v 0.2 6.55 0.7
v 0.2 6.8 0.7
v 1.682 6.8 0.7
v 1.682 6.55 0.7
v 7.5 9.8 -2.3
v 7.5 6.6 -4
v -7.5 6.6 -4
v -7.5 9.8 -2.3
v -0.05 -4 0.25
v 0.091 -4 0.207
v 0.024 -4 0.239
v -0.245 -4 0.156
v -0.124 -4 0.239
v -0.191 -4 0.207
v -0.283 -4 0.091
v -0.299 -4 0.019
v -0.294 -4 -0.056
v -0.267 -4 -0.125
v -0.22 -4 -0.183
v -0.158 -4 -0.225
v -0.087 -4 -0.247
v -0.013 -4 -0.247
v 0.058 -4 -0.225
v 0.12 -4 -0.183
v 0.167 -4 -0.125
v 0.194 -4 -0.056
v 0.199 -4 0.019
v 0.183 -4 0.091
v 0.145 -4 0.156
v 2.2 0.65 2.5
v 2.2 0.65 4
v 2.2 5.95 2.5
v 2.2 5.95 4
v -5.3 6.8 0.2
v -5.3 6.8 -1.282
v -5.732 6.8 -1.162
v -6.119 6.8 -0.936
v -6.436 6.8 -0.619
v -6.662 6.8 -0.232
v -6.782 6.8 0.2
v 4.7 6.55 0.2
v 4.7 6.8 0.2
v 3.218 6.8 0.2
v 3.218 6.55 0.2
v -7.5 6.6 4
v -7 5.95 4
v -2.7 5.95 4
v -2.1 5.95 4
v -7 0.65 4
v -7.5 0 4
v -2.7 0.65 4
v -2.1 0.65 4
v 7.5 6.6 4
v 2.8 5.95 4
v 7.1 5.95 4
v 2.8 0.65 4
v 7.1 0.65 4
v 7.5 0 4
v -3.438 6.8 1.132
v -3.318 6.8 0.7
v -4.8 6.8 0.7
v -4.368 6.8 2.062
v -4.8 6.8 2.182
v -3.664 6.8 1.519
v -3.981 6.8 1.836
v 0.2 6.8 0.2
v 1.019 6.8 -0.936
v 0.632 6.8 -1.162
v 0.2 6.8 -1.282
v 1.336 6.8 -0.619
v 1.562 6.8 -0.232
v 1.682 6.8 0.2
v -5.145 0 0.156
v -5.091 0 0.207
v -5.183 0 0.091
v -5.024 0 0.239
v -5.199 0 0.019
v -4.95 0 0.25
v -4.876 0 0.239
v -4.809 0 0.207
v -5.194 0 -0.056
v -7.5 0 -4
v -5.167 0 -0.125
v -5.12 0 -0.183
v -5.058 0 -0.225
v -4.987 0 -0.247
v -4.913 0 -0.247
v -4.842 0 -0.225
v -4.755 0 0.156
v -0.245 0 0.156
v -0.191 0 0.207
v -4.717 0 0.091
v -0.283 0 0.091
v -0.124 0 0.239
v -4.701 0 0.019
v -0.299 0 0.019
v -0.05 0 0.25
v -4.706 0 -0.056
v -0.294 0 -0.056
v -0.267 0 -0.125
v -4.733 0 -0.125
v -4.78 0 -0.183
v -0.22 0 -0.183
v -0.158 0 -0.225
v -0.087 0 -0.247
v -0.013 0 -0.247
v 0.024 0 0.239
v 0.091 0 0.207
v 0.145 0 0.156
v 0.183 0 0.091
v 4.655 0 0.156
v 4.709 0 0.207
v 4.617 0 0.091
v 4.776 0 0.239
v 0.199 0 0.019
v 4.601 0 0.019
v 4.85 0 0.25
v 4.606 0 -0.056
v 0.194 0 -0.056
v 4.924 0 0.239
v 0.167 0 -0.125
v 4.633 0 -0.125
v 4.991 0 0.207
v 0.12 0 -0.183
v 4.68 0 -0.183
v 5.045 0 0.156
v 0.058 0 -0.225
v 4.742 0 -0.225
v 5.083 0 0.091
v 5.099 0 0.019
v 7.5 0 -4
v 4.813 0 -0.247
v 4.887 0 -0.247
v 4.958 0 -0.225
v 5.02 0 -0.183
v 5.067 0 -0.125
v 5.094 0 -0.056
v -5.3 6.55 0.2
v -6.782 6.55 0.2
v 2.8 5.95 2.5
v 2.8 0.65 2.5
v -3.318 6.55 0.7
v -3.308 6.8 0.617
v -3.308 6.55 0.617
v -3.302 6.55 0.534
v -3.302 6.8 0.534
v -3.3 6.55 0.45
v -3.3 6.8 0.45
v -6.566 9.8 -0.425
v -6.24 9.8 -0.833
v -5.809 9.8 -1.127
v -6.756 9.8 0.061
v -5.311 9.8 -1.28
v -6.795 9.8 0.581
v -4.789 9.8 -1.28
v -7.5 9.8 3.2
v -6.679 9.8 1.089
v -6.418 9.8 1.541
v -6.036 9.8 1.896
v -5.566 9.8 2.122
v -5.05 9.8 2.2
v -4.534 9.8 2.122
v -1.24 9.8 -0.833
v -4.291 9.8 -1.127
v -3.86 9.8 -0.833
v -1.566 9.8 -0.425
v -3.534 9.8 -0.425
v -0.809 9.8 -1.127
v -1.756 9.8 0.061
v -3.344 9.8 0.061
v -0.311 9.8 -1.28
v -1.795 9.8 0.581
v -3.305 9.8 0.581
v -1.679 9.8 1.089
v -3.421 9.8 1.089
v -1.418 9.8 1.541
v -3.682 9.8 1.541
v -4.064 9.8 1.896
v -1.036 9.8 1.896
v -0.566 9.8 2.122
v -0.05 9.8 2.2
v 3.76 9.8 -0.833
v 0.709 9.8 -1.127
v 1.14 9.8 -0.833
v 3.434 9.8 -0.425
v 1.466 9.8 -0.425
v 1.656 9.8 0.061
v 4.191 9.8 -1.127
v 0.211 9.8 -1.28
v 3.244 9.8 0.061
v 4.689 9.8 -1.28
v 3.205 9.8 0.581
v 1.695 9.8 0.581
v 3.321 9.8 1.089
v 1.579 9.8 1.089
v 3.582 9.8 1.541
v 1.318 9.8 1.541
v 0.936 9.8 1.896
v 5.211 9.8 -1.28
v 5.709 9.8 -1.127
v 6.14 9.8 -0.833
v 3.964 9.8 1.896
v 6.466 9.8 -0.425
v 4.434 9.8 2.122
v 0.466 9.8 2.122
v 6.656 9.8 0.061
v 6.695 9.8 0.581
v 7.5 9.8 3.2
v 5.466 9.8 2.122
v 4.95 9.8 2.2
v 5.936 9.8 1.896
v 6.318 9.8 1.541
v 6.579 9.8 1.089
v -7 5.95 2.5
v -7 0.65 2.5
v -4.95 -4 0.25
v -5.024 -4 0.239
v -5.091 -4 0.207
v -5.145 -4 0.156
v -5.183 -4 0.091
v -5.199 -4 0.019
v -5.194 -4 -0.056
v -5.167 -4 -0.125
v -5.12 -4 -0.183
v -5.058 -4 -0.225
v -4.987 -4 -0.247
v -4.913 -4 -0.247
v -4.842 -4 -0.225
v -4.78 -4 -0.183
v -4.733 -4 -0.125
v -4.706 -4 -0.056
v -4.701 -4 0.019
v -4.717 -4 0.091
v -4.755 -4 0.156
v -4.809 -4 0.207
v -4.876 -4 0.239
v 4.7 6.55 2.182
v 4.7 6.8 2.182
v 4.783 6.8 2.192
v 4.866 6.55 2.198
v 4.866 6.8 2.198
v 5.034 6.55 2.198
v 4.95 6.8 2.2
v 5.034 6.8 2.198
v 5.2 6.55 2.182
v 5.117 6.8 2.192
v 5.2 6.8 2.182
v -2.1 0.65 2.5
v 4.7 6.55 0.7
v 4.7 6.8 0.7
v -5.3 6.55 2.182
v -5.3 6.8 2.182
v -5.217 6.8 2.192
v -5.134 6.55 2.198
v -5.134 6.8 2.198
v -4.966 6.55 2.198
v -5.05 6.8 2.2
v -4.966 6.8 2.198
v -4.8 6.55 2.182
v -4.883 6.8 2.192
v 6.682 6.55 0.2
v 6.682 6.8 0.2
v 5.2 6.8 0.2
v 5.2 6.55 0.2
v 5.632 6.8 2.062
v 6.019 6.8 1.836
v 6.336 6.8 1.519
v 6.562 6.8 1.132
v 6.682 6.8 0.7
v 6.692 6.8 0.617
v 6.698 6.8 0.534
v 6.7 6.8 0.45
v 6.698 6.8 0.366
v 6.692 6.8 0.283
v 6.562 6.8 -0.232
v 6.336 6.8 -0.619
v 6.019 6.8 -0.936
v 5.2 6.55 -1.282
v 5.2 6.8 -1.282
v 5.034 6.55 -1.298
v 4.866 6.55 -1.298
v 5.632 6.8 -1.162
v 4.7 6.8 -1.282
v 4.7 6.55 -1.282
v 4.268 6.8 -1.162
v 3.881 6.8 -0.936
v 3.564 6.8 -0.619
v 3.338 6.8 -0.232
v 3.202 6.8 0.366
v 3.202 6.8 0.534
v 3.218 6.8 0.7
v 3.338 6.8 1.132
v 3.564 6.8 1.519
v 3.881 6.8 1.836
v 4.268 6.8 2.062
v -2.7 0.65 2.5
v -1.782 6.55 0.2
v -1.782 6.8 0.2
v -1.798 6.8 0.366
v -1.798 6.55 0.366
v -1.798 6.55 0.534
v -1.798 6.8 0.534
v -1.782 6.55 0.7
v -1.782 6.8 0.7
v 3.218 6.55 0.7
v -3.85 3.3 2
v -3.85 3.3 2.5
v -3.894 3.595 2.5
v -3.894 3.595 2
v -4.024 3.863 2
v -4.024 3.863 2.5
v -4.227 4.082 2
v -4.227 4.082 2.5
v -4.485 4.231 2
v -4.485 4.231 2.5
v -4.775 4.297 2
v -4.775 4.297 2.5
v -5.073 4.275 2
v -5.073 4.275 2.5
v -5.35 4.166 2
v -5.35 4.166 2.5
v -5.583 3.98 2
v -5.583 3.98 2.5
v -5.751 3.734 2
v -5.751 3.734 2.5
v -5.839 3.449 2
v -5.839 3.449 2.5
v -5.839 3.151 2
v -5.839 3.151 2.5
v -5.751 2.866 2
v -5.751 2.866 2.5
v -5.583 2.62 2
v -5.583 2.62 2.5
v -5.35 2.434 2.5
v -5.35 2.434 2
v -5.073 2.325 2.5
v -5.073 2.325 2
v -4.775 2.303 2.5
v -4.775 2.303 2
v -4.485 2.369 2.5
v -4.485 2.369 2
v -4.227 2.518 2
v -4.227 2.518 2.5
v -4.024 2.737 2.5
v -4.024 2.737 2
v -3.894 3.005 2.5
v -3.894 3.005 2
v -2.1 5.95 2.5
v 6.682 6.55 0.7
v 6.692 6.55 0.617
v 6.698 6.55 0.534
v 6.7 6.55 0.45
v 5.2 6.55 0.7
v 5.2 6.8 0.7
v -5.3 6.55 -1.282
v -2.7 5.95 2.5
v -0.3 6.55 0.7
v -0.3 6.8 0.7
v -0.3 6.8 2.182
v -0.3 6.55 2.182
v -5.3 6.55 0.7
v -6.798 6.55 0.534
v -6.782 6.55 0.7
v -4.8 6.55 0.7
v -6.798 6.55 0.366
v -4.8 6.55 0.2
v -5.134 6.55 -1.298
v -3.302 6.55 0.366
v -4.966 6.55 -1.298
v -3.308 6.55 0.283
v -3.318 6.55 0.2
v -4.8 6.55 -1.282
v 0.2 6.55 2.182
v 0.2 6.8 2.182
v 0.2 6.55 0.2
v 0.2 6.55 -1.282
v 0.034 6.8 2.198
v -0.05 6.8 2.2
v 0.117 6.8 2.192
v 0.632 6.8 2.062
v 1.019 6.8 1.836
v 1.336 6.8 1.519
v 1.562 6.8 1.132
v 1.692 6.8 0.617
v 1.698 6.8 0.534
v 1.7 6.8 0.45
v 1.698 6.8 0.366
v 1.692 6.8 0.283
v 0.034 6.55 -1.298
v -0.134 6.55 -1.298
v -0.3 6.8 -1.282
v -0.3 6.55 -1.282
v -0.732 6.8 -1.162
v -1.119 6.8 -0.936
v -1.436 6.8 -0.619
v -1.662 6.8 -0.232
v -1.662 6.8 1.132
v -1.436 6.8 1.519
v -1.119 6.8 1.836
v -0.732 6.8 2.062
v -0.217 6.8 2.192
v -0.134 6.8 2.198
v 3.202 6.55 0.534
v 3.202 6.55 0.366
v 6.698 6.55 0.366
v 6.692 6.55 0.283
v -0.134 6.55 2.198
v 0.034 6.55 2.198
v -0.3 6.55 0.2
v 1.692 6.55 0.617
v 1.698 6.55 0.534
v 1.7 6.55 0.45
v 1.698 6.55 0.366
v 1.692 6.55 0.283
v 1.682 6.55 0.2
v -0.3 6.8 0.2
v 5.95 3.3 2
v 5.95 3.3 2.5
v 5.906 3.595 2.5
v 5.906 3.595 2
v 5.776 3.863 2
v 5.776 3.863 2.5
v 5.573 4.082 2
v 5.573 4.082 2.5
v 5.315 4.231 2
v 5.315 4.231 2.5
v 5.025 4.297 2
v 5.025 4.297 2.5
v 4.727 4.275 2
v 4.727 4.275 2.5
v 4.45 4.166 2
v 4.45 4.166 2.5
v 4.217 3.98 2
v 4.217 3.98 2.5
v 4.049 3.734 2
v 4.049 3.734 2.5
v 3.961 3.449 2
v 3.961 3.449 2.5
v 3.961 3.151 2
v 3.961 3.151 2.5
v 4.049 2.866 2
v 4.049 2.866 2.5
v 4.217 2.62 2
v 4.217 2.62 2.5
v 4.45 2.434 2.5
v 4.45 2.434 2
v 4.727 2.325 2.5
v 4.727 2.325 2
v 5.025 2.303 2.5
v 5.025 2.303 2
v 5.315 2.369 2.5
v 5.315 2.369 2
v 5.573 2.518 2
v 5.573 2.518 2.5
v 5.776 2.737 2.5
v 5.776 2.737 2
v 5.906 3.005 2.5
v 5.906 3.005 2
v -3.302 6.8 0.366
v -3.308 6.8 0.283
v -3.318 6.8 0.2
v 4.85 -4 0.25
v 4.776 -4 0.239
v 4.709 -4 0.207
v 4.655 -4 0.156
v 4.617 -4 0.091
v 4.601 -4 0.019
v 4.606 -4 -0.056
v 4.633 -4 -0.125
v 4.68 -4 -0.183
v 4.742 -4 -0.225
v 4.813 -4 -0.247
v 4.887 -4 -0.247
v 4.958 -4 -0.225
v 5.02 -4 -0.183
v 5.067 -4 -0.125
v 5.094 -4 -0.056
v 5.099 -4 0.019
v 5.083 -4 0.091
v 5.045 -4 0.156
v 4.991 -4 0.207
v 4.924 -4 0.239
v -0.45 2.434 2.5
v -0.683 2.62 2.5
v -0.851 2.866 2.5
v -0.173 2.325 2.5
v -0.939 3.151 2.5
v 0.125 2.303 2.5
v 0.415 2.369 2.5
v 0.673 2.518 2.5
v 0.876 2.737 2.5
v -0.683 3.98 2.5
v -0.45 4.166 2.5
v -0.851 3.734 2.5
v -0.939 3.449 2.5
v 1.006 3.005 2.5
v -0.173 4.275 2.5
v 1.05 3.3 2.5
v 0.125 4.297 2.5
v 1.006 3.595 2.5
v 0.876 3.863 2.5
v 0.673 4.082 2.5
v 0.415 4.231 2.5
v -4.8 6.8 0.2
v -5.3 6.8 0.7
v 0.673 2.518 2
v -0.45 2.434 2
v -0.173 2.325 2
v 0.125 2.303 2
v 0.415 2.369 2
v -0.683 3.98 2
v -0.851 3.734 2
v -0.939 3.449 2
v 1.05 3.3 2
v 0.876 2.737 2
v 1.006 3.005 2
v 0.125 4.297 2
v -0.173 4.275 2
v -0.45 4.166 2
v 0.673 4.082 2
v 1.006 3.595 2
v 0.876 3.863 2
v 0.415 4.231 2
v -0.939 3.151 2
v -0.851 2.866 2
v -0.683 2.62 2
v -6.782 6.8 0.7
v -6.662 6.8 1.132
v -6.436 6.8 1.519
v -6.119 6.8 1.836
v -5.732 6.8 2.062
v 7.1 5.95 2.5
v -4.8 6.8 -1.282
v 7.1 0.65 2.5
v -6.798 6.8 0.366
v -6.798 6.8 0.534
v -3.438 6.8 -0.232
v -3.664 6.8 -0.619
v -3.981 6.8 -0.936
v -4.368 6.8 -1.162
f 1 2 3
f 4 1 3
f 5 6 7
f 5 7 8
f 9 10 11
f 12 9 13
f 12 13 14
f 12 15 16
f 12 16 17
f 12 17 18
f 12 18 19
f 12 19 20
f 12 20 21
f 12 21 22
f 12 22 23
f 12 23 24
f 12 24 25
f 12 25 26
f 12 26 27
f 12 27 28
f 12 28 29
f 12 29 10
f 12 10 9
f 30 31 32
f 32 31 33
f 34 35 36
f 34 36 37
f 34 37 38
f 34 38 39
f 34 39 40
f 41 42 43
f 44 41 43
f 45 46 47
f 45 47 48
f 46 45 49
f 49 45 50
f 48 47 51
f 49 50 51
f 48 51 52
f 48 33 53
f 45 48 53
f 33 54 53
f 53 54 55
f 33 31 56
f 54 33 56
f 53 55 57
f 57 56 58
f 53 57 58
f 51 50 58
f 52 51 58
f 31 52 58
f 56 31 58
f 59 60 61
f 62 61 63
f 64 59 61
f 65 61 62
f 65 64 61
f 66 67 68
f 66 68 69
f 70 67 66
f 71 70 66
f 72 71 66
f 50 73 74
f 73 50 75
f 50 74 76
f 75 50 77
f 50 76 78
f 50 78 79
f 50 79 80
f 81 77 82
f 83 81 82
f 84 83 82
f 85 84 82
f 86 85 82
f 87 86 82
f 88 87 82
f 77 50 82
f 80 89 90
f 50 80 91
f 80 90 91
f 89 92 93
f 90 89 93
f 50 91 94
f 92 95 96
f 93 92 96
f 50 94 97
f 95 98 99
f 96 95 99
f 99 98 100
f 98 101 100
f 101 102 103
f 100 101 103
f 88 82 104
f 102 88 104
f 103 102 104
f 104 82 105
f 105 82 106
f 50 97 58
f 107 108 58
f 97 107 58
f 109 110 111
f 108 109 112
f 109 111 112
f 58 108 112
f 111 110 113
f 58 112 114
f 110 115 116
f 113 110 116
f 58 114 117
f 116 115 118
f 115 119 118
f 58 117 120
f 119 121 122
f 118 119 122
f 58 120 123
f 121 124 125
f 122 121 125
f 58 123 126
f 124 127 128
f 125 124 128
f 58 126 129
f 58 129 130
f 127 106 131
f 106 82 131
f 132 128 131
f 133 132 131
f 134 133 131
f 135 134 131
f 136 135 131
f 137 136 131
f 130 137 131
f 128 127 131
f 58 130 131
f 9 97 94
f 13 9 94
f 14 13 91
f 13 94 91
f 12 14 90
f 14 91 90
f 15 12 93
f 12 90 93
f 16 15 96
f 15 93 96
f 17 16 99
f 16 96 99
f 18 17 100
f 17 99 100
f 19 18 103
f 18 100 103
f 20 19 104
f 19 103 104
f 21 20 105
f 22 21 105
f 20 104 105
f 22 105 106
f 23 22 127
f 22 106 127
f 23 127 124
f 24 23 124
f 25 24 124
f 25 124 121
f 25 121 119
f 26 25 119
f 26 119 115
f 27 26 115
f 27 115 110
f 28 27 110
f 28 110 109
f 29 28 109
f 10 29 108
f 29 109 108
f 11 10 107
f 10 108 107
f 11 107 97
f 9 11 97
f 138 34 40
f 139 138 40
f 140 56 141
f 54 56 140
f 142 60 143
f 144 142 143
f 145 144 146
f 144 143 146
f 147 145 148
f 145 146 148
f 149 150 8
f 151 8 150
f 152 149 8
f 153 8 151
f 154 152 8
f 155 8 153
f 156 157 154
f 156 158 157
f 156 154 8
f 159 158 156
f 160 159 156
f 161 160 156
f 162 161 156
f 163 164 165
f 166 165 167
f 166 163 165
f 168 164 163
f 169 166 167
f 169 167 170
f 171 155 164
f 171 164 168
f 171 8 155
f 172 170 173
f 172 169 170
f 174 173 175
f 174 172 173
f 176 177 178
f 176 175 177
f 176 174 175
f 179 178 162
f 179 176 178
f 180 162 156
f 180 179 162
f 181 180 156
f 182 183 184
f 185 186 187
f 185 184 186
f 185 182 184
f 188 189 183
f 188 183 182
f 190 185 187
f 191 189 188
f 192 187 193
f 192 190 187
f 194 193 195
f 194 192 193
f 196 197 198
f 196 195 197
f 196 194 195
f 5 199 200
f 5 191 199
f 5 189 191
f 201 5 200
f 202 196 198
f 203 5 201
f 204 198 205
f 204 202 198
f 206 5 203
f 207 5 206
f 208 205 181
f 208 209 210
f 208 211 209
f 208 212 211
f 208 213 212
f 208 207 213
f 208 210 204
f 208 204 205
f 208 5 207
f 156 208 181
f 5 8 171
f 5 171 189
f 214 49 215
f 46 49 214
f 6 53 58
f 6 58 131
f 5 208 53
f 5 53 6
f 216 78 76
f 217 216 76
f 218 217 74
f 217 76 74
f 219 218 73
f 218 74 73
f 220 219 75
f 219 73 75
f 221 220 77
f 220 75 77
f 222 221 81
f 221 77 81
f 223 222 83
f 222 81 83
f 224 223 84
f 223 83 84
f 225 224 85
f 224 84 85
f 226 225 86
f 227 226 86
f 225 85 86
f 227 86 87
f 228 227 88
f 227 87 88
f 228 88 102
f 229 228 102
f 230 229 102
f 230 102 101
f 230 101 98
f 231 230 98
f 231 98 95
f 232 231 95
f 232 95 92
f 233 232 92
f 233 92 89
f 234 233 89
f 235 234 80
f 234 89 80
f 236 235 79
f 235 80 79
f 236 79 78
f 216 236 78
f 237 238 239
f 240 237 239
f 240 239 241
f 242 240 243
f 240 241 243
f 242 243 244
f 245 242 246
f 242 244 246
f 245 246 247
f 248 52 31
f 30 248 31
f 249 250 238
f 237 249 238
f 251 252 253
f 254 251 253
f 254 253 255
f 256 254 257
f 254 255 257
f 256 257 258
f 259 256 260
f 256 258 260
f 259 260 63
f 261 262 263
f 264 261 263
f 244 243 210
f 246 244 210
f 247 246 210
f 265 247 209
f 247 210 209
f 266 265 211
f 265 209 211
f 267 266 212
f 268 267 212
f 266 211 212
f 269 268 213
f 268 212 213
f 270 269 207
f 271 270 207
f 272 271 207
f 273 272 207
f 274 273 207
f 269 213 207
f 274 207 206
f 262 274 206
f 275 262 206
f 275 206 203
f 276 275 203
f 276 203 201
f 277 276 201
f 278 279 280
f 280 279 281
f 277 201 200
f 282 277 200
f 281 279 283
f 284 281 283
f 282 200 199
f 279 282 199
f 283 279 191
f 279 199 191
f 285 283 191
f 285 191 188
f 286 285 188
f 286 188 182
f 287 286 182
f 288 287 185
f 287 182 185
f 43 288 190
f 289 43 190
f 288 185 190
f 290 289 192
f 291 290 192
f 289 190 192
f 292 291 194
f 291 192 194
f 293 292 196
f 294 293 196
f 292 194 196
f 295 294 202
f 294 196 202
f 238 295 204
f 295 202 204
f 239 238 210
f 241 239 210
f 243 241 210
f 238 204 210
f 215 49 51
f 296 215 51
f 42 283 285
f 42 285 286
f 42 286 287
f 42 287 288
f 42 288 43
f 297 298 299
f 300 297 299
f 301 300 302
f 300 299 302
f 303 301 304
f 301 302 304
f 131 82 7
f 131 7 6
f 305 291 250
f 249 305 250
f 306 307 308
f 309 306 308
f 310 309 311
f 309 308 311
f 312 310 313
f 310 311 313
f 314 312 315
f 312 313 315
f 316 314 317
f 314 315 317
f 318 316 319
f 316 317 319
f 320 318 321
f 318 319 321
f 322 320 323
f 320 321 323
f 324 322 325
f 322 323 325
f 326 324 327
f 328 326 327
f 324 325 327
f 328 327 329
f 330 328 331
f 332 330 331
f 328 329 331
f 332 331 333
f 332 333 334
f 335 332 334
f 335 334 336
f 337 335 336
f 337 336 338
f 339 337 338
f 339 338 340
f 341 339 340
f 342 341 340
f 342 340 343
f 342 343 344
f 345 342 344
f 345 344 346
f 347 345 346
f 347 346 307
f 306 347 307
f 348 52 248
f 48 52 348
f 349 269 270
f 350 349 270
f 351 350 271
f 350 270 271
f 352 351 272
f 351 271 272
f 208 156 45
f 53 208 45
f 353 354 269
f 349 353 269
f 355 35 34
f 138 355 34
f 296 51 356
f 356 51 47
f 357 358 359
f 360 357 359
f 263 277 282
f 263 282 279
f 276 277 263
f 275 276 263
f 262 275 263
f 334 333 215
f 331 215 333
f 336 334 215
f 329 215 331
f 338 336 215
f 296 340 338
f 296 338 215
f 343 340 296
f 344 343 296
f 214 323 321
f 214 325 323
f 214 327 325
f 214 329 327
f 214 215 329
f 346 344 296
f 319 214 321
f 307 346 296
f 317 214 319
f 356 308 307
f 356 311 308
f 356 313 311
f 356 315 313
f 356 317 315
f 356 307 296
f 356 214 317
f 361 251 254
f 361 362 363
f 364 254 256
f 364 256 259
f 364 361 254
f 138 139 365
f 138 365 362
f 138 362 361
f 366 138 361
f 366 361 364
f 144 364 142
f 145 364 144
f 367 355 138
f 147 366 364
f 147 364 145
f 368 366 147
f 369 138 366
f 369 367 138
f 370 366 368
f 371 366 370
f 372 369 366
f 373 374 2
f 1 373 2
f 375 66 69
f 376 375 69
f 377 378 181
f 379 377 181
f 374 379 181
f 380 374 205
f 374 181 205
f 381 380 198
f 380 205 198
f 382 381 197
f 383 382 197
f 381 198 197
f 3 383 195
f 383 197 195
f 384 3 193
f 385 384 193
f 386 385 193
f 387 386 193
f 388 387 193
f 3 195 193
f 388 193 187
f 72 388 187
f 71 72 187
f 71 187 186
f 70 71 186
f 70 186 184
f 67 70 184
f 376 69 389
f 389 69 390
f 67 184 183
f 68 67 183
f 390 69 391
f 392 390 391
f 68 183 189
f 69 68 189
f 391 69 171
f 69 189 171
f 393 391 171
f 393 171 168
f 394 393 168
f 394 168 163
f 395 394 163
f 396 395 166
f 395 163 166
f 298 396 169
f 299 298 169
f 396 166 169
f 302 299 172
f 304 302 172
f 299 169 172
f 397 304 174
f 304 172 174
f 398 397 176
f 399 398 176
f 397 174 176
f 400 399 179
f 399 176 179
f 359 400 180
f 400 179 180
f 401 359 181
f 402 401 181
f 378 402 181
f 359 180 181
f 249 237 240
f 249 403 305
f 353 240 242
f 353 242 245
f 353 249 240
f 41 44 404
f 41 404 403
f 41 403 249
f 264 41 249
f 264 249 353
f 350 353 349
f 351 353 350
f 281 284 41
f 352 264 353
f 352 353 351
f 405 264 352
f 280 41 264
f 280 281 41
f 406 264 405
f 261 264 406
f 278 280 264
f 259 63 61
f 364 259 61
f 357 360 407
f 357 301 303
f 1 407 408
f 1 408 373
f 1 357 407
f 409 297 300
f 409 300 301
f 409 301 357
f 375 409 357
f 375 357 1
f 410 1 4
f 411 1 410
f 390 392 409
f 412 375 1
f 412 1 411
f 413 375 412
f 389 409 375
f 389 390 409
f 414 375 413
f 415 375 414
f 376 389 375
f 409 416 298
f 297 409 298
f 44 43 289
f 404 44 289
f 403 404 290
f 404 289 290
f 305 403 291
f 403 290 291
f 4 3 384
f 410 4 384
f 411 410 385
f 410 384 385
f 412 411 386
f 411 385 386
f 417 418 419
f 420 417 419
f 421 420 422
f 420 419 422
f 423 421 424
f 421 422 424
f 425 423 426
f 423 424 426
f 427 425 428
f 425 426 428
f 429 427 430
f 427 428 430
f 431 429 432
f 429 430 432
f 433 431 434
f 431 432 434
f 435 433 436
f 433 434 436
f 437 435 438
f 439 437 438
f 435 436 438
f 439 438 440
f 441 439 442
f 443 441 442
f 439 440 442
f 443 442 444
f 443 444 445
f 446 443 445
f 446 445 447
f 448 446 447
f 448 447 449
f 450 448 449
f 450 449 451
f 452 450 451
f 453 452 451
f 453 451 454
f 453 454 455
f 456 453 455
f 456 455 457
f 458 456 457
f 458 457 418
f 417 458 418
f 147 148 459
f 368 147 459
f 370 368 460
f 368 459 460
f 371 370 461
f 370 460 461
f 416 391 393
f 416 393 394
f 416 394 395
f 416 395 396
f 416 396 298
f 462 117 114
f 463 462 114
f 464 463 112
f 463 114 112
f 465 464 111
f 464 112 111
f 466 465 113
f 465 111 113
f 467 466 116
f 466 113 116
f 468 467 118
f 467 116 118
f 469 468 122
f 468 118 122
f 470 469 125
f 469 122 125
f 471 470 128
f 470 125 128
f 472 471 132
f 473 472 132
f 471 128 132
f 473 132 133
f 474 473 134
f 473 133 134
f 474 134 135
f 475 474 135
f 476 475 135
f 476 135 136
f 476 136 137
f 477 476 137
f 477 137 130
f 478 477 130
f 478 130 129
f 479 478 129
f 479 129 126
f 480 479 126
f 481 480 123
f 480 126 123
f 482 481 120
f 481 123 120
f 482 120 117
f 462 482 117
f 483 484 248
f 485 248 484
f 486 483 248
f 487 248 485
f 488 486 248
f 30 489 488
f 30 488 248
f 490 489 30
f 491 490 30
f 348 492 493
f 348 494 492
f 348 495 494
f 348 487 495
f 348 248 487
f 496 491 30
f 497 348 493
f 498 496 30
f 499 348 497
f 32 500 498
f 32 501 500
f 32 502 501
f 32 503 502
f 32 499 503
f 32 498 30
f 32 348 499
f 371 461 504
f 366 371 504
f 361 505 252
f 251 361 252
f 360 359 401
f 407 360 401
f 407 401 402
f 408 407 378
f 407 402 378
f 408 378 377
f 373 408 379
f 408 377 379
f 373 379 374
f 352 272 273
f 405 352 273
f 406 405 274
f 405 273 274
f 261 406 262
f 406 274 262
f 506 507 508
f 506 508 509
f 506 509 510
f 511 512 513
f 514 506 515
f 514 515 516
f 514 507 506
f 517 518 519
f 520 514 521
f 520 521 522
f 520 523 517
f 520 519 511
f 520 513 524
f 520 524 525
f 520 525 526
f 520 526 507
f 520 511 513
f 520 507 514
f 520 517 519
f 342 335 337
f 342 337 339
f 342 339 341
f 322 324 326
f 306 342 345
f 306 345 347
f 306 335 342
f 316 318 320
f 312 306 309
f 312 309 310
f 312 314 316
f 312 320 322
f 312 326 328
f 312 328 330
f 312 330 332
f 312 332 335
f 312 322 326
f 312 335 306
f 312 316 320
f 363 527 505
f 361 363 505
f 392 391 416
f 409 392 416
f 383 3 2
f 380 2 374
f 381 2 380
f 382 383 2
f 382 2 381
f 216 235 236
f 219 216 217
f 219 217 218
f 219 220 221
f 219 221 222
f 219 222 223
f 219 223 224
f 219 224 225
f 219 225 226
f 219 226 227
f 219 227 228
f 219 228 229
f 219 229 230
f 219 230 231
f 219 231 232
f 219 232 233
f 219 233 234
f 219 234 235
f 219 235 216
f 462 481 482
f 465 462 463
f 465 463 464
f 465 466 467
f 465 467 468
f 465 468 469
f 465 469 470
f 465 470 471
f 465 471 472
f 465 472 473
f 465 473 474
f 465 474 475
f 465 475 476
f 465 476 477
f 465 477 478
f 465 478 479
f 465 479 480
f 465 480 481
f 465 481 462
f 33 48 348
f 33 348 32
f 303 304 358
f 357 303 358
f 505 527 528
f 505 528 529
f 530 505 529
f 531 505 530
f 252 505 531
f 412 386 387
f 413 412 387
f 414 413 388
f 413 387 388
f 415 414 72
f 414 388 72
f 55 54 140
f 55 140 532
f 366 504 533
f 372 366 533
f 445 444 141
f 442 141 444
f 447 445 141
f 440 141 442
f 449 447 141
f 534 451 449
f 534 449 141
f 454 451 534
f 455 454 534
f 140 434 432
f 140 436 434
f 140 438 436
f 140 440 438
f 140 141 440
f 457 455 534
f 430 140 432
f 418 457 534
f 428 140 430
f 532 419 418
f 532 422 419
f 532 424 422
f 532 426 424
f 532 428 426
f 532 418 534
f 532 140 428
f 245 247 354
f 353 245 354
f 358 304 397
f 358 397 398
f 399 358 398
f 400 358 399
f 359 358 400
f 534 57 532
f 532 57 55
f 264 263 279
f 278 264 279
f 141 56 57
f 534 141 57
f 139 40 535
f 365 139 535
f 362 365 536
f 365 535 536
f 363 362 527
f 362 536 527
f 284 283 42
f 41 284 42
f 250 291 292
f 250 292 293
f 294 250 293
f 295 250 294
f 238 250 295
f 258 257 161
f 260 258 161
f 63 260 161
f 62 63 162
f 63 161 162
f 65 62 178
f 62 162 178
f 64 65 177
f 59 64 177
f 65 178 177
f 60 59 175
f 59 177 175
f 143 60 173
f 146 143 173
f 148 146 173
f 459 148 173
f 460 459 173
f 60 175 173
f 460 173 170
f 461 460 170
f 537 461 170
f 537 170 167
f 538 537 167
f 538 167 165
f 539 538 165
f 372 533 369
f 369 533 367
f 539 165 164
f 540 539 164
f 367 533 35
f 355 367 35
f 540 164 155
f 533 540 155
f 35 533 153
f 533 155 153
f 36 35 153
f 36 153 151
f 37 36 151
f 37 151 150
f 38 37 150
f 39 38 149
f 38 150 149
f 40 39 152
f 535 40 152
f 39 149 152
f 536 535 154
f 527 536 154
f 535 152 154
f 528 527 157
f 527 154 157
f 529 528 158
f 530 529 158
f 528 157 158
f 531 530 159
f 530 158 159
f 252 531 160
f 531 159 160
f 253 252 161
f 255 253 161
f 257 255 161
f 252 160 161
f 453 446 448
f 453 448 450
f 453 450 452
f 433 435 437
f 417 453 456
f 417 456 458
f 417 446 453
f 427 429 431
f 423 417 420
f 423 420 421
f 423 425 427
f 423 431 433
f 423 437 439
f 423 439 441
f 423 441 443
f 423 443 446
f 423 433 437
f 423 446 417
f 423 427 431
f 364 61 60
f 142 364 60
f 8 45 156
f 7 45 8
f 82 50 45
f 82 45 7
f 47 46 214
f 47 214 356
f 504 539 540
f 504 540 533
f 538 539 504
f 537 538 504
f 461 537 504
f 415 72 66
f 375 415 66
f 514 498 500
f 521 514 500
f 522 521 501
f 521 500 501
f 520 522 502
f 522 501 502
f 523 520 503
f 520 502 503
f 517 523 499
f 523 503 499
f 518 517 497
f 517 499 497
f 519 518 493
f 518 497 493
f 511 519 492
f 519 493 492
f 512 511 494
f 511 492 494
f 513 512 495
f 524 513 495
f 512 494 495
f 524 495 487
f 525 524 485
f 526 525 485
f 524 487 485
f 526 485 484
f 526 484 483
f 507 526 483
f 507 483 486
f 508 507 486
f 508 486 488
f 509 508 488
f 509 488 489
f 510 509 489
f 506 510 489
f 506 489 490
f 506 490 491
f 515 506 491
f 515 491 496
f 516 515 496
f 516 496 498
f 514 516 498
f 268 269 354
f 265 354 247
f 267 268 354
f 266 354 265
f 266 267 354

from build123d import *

# Parameters (mm, degrees)
CROQUIS1_W                          = 15
CROQUIS1_H                          = 8
SALIENTE_EXTRUIR1_DEPTH             = 6.6
SALIENTE_EXTRUIR2_REACH             = 12.762
SALIENTE_EXTRUIR2_DIRECTION_2_REACH = 12.762
CROQUIS3_R                          = 1.75
CORTAR_EXTRUIR1_DEPTH               = 3
CORTAR_EXTRUIR2_DEPTH               = 0.25
MATRIZL1_COUNT                      = 3
MATRIZL1_PITCH                      = 5
CROQUIS5_R                          = 0.25
SALIENTE_EXTRUIR3_DEPTH             = 4
MATRIZL2_COUNT                      = 3
MATRIZL2_PITCH                      = 4.9
CROQUIS6_W                          = 4.3
CROQUIS6_H                          = 5.3
CROQUIS6_R                          = 1
CORTAR_EXTRUIR3_DEPTH               = 1.5
CROQUIS6_2_R                        = 1
CORTAR_EXTRUIR4_DEPTH               = 2
MATRIZL3_COUNT                      = 3
MATRIZL3_PITCH                      = 4.9


with BuildPart() as part:
    # Croquis1 → Saliente-Extruir1 (new body)
    with BuildSketch(Plane(origin=(0, 0, 0), x_dir=(1, 0, 0), z_dir=(0, 1, 0))):
        Rectangle(CROQUIS1_W, CROQUIS1_H)
    extrude(amount=SALIENTE_EXTRUIR1_DEPTH)

    # Saliente-Extruir2: up to this face of the body (flat: up to its plane)
    saliente_extruir2_end = Plane(part.part.faces().sort_by_distance((7.5, 3.3, 0))[0])
    # Croquis2 → Saliente-Extruir2 (add, up to the picked face)
    with BuildSketch(Plane(origin=(0, 0, 0), x_dir=(0, 0, -1), z_dir=(1, 0, 0)), mode=Mode.PRIVATE) as saliente_extruir2_sk1:
        Polygon((-4, 6.6), (4, 6.6), (2.3, 9.8), (-3.2, 9.8), align=None)
    saliente_extruir2_tool1 = split(extrude(saliente_extruir2_sk1.sketch, amount=SALIENTE_EXTRUIR2_REACH, mode=Mode.PRIVATE), bisect_by=saliente_extruir2_end, keep=Keep.BOTH, mode=Mode.PRIVATE)
    add(saliente_extruir2_tool1.solids().sort_by(Axis((0, 8.101235, 0.211111), (1, 0, 0)))[0])

    # Saliente-Extruir2 direction 2: up to this face of the body (flat: up to its plane)
    saliente_extruir2_direction_2_end = Plane(part.part.faces().sort_by_distance((-7.5, 3.3, 0))[0])
    # Croquis2 → Saliente-Extruir2 direction 2 (add, up to the picked face)
    with BuildSketch(Plane(origin=(0, 0, 0), x_dir=(0, 0, -1), z_dir=(1, 0, 0)), mode=Mode.PRIVATE) as saliente_extruir2_direction_2_sk1:
        Polygon((-4, 6.6), (4, 6.6), (2.3, 9.8), (-3.2, 9.8), align=None)
    saliente_extruir2_direction_2_tool1 = split(extrude(saliente_extruir2_direction_2_sk1.sketch, amount=-SALIENTE_EXTRUIR2_DIRECTION_2_REACH, mode=Mode.PRIVATE), bisect_by=saliente_extruir2_direction_2_end, keep=Keep.BOTH, mode=Mode.PRIVATE)
    add(saliente_extruir2_direction_2_tool1.solids().sort_by(Axis((0, 8.101235, 0.211111), (-1, 0, 0)))[0])

    # Croquis3 → Cortar-Extruir1 (cut)
    with BuildSketch(Plane(origin=(0, 9.8, 0), x_dir=(1, 0, 0), z_dir=(0, 1, 0))):
        with Locations((-5.05, -0.45)):
            Circle(CROQUIS3_R)
    cortar_extruir1 = extrude(amount=-CORTAR_EXTRUIR1_DEPTH, mode=Mode.SUBTRACT)

    # Croquis4 → Cortar-Extruir2 (cut)
    with BuildSketch(Plane(origin=(0, 6.8, 0), x_dir=(1, 0, 0), z_dir=(0, 1, 0))):
        with BuildLine():
            ThreePointArc((-5.3, -2.182050808), (-5.05, -2.2), (-4.8, -2.182050808))
            Line((-4.8, -2.182050808), (-4.8, -0.7))
            Line((-4.8, -0.7), (-3.317949192, -0.7))
            ThreePointArc((-3.317949192, -0.7), (-3.304493066, -0.575321759), (-3.3, -0.45))
            ThreePointArc((-3.3, -0.45), (-3.304493066, -0.324678241), (-3.317949192, -0.2))
            Line((-3.317949192, -0.2), (-4.8, -0.2))
            Line((-4.8, -0.2), (-4.8, 1.282050808))
            ThreePointArc((-4.8, 1.282050808), (-5.05, 1.3), (-5.3, 1.282050808))
            Line((-5.3, 1.282050808), (-5.3, -0.2))
            Line((-5.3, -0.2), (-6.782050808, -0.2))
            ThreePointArc((-6.782050808, -0.2), (-6.8, -0.45), (-6.782050808, -0.7))
            Line((-6.782050808, -0.7), (-5.3, -0.7))
            Line((-5.3, -0.7), (-5.3, -2.182050808))
        make_face()
    cortar_extruir2 = extrude(amount=-CORTAR_EXTRUIR2_DEPTH, mode=Mode.SUBTRACT)

    # MatrizL1: Cortar-Extruir1, Cortar-Extruir2 ×3
    with Locations(*[(i * MATRIZL1_PITCH, 0, 0) for i in range(1, MATRIZL1_COUNT)]):
        add(cortar_extruir1, mode=Mode.SUBTRACT)
        add(cortar_extruir2, mode=Mode.SUBTRACT)

    # Croquis5 → Saliente-Extruir3 (add)
    with BuildSketch(Plane.XZ):
        with Locations((-4.95, 0)):
            Circle(CROQUIS5_R)
    saliente_extruir3 = extrude(amount=SALIENTE_EXTRUIR3_DEPTH)

    # MatrizL2: Saliente-Extruir3 ×3
    with Locations(*[(i * MATRIZL2_PITCH, 0, 0) for i in range(1, MATRIZL2_COUNT)]):
        add(saliente_extruir3)

    # Croquis6 → Cortar-Extruir3 (cut)
    with BuildSketch(Plane.XY.offset(4)):
        with Locations((-4.85, 3.3)):
            Rectangle(CROQUIS6_W, CROQUIS6_H)
        with Locations((-4.85, 3.3)):
            Circle(CROQUIS6_R, mode=Mode.SUBTRACT)
    cortar_extruir3 = extrude(amount=-CORTAR_EXTRUIR3_DEPTH, mode=Mode.SUBTRACT)

    # Croquis6<2> → Cortar-Extruir4 (cut)
    with BuildSketch(Plane.XY.offset(4)):
        with Locations((-4.85, 3.3)):
            Circle(CROQUIS6_2_R)
    cortar_extruir4 = extrude(amount=-CORTAR_EXTRUIR4_DEPTH, mode=Mode.SUBTRACT)

    # MatrizL3: Cortar-Extruir3, Cortar-Extruir4 ×3
    with Locations(*[(i * MATRIZL3_PITCH, 0, 0) for i in range(1, MATRIZL3_COUNT)]):
        add(cortar_extruir3, mode=Mode.SUBTRACT)
        add(cortar_extruir4, mode=Mode.SUBTRACT)


solid = part.part
